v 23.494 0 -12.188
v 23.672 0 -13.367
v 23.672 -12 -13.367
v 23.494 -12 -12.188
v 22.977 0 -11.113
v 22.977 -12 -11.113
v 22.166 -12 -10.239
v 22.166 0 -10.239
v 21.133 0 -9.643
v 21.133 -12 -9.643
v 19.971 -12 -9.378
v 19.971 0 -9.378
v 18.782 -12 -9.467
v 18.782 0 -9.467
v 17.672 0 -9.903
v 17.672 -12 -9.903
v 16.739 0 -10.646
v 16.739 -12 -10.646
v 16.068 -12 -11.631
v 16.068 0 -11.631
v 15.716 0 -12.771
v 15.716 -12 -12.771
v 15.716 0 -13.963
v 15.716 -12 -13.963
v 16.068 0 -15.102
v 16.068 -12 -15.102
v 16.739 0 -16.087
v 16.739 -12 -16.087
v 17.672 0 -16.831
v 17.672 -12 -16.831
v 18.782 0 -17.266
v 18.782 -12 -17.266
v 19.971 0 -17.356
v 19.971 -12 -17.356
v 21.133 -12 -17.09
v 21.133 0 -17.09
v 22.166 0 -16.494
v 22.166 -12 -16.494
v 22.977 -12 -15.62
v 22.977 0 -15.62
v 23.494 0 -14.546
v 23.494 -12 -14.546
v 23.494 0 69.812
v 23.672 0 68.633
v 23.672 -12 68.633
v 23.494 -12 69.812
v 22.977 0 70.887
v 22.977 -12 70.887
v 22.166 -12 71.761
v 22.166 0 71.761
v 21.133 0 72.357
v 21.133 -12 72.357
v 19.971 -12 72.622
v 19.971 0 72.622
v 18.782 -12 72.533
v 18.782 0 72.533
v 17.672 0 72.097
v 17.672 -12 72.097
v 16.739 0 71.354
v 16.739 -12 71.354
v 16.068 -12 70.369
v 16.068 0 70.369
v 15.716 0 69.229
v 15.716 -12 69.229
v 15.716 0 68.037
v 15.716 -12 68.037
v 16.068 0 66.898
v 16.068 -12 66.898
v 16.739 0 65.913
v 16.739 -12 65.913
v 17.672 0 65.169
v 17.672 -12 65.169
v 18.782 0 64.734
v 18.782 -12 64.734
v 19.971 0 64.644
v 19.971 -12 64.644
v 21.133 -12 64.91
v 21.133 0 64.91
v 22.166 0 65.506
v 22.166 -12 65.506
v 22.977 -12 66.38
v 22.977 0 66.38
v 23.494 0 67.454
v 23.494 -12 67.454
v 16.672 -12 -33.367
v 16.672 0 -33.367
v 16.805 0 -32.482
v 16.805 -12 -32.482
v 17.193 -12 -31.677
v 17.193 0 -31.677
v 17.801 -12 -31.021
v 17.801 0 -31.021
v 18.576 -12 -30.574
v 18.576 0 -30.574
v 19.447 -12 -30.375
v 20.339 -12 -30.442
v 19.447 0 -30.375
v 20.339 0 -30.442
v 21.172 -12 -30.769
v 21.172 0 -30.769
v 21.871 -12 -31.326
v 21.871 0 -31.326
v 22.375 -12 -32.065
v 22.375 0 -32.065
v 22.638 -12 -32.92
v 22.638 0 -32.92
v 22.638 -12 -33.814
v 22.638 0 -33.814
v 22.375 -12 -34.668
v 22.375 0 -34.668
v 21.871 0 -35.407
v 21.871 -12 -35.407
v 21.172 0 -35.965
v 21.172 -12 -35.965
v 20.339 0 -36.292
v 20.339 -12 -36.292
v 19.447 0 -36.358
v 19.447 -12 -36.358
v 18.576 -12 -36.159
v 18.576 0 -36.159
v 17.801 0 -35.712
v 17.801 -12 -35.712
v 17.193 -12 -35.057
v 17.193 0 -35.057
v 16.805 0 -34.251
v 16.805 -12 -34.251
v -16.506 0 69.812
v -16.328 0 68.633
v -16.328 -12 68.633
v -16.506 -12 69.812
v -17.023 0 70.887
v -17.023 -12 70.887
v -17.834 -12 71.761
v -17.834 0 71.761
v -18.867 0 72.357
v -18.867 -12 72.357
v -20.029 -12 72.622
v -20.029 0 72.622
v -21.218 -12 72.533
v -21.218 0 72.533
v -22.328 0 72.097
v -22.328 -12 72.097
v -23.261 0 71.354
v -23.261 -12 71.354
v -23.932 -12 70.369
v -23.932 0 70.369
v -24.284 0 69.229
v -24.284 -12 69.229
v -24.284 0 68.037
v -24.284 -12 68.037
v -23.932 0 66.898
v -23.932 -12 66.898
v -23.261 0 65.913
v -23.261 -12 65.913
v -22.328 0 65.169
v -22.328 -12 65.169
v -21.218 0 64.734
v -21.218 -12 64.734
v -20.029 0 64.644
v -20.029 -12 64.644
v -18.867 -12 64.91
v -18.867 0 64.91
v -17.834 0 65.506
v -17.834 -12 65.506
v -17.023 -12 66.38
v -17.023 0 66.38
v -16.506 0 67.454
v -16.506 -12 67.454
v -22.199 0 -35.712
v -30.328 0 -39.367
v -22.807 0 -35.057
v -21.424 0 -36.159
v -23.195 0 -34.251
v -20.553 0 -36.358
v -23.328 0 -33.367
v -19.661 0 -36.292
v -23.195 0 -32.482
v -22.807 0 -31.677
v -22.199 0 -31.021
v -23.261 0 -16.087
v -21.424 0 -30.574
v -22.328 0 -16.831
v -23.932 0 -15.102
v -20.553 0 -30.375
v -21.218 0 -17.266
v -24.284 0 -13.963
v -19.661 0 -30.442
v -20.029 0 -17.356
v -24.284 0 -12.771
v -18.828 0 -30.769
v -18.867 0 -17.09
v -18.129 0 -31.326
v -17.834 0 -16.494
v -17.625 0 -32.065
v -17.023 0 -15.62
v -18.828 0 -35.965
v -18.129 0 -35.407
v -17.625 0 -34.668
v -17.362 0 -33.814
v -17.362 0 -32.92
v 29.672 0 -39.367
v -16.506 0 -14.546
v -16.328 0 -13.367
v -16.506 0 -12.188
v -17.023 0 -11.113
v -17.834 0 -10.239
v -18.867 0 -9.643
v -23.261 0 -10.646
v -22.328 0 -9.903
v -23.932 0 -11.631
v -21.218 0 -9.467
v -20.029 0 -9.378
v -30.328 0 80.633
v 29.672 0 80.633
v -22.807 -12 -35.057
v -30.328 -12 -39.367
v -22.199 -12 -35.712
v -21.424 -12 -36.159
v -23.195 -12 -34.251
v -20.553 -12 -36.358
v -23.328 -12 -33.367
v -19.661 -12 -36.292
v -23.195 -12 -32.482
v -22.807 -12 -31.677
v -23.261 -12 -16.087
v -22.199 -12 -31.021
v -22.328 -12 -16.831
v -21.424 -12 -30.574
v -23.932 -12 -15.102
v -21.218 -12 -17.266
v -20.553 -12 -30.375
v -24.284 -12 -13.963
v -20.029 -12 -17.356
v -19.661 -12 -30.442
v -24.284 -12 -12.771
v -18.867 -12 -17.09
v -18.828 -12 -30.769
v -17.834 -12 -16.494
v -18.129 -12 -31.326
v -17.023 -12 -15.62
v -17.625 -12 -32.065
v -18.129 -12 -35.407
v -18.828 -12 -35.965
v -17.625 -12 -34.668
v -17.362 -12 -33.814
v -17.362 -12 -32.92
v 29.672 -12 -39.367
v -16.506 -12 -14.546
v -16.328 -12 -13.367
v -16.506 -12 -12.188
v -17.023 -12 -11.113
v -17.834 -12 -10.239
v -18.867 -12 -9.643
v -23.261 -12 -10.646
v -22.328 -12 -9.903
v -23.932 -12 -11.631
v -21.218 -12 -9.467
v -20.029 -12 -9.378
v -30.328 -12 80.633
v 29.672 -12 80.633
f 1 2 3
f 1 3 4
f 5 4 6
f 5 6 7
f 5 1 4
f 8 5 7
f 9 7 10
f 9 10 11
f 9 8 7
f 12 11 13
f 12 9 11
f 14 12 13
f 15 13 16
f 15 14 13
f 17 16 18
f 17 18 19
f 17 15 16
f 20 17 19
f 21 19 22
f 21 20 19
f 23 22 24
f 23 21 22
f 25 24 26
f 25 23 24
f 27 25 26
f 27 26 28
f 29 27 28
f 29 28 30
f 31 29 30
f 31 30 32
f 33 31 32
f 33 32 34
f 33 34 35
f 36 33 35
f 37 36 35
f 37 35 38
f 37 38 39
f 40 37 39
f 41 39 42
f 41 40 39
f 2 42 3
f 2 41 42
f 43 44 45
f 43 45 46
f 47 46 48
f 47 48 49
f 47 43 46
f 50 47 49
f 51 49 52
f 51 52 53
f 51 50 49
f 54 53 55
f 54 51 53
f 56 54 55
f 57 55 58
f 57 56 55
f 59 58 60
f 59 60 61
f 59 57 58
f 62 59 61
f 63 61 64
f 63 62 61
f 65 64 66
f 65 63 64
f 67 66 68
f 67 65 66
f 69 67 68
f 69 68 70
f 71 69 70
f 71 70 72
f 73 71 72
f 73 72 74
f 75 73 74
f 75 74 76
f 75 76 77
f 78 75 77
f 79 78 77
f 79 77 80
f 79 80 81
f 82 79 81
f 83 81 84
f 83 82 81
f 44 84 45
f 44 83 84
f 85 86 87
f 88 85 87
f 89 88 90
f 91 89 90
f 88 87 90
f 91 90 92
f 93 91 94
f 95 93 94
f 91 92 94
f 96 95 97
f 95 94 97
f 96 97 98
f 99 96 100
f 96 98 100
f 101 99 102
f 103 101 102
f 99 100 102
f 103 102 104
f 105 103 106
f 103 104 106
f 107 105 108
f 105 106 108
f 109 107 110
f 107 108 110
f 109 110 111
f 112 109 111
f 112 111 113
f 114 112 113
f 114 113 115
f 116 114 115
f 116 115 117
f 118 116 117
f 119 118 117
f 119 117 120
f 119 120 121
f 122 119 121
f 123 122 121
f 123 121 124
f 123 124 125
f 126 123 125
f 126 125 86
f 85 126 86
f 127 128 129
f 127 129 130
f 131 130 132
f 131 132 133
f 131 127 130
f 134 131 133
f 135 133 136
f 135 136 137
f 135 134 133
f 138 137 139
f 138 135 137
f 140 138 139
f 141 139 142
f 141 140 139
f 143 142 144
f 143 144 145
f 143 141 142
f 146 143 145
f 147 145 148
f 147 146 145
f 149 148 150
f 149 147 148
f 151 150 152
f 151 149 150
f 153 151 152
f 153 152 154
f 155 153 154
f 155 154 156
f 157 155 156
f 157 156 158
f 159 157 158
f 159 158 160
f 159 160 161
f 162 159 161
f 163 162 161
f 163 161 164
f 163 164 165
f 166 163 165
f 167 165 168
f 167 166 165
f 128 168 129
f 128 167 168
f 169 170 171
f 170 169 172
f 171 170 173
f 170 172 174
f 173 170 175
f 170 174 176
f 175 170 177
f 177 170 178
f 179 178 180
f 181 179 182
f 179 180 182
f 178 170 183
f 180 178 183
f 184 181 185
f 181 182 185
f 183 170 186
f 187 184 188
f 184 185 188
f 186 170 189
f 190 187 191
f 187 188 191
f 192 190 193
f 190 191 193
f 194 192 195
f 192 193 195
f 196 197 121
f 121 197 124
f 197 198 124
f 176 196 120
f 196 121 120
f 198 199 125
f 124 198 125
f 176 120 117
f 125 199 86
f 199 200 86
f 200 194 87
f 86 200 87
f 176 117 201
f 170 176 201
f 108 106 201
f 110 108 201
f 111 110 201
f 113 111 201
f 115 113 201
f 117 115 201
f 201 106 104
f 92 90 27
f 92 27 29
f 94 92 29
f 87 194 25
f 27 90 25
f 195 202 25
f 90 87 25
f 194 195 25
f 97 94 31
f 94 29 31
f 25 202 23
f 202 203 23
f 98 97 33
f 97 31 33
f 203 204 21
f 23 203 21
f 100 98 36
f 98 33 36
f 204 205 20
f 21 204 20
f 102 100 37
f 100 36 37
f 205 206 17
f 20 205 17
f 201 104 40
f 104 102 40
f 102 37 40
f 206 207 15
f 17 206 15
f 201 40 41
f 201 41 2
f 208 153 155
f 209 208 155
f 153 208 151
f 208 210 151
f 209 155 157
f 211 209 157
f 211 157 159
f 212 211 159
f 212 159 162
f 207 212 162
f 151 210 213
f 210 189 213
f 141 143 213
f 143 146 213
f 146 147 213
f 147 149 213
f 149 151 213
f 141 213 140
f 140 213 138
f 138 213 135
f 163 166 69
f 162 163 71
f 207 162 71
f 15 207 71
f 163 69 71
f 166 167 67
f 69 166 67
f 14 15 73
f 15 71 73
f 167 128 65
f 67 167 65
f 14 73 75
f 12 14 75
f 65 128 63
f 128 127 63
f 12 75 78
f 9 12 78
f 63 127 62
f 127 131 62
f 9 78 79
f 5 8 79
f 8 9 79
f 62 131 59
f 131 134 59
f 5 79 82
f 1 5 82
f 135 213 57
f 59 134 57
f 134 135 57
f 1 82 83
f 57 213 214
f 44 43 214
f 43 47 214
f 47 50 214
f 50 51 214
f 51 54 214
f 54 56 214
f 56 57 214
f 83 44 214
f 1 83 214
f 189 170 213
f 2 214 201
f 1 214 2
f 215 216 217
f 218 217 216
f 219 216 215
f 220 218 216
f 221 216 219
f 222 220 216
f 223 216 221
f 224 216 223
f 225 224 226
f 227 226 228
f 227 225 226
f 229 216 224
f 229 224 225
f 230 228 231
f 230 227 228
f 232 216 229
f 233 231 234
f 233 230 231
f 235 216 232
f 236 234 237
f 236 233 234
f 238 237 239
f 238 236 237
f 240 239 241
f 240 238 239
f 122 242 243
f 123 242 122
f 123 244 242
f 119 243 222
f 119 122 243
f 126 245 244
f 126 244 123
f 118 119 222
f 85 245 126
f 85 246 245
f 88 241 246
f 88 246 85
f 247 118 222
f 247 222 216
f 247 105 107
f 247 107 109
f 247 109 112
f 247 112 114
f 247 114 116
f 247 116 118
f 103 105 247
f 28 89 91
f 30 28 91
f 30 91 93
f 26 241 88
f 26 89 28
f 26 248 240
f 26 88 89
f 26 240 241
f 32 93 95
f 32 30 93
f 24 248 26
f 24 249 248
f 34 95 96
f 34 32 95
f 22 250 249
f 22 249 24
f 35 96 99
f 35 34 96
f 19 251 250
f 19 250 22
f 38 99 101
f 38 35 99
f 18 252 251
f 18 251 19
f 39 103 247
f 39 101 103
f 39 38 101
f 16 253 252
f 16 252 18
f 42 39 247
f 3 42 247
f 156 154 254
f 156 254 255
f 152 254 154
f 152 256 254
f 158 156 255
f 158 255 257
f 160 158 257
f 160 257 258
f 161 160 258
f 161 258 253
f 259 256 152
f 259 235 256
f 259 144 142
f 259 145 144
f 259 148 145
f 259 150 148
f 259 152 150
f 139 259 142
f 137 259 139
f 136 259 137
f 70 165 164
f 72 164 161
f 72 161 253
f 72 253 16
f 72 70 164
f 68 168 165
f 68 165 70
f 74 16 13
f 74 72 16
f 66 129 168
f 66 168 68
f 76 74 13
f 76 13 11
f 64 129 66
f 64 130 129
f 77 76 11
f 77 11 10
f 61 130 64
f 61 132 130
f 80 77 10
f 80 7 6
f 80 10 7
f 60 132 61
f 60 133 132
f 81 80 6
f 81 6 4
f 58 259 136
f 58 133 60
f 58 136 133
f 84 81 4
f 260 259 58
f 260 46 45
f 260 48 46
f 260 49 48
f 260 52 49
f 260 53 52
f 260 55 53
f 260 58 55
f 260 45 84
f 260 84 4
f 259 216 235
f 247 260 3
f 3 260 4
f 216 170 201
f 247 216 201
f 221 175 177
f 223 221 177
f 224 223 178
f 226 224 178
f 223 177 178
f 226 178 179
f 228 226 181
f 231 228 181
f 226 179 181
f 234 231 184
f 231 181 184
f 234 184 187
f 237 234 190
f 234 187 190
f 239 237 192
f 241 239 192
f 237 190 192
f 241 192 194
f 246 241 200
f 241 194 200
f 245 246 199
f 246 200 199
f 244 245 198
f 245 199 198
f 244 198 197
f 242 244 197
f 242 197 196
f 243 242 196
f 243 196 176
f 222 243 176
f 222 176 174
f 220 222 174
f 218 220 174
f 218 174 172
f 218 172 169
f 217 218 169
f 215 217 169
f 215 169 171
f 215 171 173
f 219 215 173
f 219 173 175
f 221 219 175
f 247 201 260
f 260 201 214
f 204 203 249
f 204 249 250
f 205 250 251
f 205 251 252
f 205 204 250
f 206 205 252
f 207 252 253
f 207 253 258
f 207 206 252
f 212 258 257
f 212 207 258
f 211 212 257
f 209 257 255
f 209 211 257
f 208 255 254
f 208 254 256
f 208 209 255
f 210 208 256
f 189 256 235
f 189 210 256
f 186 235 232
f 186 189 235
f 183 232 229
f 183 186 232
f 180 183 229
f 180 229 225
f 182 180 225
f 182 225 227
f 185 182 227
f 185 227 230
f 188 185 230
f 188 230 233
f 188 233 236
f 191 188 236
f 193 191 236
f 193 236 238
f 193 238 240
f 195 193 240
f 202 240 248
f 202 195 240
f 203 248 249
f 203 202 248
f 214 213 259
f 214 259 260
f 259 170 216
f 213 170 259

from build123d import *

# Parameters (mm, degrees)
F0_W     = 60
F0_H     = 120
F0_R     = 4
F1_DEPTH = 12
F3_D     = 6


with BuildPart() as f1:
    # F0 (on Front) → F1 (new body)
    with BuildSketch(Plane.XZ):
        with Locations((-0.328343, 20.633268)):
            Rectangle(F0_W, F0_H)
        with Locations((-20.328343, -13.366732)):
            Circle(F0_R, mode=Mode.SUBTRACT)
        with Locations((19.671657, -13.366732)):
            Circle(F0_R, mode=Mode.SUBTRACT)
        with Locations((-20.328343, 68.633268)):
            Circle(F0_R, mode=Mode.SUBTRACT)
        with Locations((19.671657, 68.633268)):
            Circle(F0_R, mode=Mode.SUBTRACT)
    extrude(amount=F1_DEPTH)

    # F3 (through all)
    with Locations(Plane.XZ.offset(12)):
        with Locations((-20.328343, -33.366732), (19.671657, -33.366732)):
            Hole(F3_D / 2)


solid = f1.part
